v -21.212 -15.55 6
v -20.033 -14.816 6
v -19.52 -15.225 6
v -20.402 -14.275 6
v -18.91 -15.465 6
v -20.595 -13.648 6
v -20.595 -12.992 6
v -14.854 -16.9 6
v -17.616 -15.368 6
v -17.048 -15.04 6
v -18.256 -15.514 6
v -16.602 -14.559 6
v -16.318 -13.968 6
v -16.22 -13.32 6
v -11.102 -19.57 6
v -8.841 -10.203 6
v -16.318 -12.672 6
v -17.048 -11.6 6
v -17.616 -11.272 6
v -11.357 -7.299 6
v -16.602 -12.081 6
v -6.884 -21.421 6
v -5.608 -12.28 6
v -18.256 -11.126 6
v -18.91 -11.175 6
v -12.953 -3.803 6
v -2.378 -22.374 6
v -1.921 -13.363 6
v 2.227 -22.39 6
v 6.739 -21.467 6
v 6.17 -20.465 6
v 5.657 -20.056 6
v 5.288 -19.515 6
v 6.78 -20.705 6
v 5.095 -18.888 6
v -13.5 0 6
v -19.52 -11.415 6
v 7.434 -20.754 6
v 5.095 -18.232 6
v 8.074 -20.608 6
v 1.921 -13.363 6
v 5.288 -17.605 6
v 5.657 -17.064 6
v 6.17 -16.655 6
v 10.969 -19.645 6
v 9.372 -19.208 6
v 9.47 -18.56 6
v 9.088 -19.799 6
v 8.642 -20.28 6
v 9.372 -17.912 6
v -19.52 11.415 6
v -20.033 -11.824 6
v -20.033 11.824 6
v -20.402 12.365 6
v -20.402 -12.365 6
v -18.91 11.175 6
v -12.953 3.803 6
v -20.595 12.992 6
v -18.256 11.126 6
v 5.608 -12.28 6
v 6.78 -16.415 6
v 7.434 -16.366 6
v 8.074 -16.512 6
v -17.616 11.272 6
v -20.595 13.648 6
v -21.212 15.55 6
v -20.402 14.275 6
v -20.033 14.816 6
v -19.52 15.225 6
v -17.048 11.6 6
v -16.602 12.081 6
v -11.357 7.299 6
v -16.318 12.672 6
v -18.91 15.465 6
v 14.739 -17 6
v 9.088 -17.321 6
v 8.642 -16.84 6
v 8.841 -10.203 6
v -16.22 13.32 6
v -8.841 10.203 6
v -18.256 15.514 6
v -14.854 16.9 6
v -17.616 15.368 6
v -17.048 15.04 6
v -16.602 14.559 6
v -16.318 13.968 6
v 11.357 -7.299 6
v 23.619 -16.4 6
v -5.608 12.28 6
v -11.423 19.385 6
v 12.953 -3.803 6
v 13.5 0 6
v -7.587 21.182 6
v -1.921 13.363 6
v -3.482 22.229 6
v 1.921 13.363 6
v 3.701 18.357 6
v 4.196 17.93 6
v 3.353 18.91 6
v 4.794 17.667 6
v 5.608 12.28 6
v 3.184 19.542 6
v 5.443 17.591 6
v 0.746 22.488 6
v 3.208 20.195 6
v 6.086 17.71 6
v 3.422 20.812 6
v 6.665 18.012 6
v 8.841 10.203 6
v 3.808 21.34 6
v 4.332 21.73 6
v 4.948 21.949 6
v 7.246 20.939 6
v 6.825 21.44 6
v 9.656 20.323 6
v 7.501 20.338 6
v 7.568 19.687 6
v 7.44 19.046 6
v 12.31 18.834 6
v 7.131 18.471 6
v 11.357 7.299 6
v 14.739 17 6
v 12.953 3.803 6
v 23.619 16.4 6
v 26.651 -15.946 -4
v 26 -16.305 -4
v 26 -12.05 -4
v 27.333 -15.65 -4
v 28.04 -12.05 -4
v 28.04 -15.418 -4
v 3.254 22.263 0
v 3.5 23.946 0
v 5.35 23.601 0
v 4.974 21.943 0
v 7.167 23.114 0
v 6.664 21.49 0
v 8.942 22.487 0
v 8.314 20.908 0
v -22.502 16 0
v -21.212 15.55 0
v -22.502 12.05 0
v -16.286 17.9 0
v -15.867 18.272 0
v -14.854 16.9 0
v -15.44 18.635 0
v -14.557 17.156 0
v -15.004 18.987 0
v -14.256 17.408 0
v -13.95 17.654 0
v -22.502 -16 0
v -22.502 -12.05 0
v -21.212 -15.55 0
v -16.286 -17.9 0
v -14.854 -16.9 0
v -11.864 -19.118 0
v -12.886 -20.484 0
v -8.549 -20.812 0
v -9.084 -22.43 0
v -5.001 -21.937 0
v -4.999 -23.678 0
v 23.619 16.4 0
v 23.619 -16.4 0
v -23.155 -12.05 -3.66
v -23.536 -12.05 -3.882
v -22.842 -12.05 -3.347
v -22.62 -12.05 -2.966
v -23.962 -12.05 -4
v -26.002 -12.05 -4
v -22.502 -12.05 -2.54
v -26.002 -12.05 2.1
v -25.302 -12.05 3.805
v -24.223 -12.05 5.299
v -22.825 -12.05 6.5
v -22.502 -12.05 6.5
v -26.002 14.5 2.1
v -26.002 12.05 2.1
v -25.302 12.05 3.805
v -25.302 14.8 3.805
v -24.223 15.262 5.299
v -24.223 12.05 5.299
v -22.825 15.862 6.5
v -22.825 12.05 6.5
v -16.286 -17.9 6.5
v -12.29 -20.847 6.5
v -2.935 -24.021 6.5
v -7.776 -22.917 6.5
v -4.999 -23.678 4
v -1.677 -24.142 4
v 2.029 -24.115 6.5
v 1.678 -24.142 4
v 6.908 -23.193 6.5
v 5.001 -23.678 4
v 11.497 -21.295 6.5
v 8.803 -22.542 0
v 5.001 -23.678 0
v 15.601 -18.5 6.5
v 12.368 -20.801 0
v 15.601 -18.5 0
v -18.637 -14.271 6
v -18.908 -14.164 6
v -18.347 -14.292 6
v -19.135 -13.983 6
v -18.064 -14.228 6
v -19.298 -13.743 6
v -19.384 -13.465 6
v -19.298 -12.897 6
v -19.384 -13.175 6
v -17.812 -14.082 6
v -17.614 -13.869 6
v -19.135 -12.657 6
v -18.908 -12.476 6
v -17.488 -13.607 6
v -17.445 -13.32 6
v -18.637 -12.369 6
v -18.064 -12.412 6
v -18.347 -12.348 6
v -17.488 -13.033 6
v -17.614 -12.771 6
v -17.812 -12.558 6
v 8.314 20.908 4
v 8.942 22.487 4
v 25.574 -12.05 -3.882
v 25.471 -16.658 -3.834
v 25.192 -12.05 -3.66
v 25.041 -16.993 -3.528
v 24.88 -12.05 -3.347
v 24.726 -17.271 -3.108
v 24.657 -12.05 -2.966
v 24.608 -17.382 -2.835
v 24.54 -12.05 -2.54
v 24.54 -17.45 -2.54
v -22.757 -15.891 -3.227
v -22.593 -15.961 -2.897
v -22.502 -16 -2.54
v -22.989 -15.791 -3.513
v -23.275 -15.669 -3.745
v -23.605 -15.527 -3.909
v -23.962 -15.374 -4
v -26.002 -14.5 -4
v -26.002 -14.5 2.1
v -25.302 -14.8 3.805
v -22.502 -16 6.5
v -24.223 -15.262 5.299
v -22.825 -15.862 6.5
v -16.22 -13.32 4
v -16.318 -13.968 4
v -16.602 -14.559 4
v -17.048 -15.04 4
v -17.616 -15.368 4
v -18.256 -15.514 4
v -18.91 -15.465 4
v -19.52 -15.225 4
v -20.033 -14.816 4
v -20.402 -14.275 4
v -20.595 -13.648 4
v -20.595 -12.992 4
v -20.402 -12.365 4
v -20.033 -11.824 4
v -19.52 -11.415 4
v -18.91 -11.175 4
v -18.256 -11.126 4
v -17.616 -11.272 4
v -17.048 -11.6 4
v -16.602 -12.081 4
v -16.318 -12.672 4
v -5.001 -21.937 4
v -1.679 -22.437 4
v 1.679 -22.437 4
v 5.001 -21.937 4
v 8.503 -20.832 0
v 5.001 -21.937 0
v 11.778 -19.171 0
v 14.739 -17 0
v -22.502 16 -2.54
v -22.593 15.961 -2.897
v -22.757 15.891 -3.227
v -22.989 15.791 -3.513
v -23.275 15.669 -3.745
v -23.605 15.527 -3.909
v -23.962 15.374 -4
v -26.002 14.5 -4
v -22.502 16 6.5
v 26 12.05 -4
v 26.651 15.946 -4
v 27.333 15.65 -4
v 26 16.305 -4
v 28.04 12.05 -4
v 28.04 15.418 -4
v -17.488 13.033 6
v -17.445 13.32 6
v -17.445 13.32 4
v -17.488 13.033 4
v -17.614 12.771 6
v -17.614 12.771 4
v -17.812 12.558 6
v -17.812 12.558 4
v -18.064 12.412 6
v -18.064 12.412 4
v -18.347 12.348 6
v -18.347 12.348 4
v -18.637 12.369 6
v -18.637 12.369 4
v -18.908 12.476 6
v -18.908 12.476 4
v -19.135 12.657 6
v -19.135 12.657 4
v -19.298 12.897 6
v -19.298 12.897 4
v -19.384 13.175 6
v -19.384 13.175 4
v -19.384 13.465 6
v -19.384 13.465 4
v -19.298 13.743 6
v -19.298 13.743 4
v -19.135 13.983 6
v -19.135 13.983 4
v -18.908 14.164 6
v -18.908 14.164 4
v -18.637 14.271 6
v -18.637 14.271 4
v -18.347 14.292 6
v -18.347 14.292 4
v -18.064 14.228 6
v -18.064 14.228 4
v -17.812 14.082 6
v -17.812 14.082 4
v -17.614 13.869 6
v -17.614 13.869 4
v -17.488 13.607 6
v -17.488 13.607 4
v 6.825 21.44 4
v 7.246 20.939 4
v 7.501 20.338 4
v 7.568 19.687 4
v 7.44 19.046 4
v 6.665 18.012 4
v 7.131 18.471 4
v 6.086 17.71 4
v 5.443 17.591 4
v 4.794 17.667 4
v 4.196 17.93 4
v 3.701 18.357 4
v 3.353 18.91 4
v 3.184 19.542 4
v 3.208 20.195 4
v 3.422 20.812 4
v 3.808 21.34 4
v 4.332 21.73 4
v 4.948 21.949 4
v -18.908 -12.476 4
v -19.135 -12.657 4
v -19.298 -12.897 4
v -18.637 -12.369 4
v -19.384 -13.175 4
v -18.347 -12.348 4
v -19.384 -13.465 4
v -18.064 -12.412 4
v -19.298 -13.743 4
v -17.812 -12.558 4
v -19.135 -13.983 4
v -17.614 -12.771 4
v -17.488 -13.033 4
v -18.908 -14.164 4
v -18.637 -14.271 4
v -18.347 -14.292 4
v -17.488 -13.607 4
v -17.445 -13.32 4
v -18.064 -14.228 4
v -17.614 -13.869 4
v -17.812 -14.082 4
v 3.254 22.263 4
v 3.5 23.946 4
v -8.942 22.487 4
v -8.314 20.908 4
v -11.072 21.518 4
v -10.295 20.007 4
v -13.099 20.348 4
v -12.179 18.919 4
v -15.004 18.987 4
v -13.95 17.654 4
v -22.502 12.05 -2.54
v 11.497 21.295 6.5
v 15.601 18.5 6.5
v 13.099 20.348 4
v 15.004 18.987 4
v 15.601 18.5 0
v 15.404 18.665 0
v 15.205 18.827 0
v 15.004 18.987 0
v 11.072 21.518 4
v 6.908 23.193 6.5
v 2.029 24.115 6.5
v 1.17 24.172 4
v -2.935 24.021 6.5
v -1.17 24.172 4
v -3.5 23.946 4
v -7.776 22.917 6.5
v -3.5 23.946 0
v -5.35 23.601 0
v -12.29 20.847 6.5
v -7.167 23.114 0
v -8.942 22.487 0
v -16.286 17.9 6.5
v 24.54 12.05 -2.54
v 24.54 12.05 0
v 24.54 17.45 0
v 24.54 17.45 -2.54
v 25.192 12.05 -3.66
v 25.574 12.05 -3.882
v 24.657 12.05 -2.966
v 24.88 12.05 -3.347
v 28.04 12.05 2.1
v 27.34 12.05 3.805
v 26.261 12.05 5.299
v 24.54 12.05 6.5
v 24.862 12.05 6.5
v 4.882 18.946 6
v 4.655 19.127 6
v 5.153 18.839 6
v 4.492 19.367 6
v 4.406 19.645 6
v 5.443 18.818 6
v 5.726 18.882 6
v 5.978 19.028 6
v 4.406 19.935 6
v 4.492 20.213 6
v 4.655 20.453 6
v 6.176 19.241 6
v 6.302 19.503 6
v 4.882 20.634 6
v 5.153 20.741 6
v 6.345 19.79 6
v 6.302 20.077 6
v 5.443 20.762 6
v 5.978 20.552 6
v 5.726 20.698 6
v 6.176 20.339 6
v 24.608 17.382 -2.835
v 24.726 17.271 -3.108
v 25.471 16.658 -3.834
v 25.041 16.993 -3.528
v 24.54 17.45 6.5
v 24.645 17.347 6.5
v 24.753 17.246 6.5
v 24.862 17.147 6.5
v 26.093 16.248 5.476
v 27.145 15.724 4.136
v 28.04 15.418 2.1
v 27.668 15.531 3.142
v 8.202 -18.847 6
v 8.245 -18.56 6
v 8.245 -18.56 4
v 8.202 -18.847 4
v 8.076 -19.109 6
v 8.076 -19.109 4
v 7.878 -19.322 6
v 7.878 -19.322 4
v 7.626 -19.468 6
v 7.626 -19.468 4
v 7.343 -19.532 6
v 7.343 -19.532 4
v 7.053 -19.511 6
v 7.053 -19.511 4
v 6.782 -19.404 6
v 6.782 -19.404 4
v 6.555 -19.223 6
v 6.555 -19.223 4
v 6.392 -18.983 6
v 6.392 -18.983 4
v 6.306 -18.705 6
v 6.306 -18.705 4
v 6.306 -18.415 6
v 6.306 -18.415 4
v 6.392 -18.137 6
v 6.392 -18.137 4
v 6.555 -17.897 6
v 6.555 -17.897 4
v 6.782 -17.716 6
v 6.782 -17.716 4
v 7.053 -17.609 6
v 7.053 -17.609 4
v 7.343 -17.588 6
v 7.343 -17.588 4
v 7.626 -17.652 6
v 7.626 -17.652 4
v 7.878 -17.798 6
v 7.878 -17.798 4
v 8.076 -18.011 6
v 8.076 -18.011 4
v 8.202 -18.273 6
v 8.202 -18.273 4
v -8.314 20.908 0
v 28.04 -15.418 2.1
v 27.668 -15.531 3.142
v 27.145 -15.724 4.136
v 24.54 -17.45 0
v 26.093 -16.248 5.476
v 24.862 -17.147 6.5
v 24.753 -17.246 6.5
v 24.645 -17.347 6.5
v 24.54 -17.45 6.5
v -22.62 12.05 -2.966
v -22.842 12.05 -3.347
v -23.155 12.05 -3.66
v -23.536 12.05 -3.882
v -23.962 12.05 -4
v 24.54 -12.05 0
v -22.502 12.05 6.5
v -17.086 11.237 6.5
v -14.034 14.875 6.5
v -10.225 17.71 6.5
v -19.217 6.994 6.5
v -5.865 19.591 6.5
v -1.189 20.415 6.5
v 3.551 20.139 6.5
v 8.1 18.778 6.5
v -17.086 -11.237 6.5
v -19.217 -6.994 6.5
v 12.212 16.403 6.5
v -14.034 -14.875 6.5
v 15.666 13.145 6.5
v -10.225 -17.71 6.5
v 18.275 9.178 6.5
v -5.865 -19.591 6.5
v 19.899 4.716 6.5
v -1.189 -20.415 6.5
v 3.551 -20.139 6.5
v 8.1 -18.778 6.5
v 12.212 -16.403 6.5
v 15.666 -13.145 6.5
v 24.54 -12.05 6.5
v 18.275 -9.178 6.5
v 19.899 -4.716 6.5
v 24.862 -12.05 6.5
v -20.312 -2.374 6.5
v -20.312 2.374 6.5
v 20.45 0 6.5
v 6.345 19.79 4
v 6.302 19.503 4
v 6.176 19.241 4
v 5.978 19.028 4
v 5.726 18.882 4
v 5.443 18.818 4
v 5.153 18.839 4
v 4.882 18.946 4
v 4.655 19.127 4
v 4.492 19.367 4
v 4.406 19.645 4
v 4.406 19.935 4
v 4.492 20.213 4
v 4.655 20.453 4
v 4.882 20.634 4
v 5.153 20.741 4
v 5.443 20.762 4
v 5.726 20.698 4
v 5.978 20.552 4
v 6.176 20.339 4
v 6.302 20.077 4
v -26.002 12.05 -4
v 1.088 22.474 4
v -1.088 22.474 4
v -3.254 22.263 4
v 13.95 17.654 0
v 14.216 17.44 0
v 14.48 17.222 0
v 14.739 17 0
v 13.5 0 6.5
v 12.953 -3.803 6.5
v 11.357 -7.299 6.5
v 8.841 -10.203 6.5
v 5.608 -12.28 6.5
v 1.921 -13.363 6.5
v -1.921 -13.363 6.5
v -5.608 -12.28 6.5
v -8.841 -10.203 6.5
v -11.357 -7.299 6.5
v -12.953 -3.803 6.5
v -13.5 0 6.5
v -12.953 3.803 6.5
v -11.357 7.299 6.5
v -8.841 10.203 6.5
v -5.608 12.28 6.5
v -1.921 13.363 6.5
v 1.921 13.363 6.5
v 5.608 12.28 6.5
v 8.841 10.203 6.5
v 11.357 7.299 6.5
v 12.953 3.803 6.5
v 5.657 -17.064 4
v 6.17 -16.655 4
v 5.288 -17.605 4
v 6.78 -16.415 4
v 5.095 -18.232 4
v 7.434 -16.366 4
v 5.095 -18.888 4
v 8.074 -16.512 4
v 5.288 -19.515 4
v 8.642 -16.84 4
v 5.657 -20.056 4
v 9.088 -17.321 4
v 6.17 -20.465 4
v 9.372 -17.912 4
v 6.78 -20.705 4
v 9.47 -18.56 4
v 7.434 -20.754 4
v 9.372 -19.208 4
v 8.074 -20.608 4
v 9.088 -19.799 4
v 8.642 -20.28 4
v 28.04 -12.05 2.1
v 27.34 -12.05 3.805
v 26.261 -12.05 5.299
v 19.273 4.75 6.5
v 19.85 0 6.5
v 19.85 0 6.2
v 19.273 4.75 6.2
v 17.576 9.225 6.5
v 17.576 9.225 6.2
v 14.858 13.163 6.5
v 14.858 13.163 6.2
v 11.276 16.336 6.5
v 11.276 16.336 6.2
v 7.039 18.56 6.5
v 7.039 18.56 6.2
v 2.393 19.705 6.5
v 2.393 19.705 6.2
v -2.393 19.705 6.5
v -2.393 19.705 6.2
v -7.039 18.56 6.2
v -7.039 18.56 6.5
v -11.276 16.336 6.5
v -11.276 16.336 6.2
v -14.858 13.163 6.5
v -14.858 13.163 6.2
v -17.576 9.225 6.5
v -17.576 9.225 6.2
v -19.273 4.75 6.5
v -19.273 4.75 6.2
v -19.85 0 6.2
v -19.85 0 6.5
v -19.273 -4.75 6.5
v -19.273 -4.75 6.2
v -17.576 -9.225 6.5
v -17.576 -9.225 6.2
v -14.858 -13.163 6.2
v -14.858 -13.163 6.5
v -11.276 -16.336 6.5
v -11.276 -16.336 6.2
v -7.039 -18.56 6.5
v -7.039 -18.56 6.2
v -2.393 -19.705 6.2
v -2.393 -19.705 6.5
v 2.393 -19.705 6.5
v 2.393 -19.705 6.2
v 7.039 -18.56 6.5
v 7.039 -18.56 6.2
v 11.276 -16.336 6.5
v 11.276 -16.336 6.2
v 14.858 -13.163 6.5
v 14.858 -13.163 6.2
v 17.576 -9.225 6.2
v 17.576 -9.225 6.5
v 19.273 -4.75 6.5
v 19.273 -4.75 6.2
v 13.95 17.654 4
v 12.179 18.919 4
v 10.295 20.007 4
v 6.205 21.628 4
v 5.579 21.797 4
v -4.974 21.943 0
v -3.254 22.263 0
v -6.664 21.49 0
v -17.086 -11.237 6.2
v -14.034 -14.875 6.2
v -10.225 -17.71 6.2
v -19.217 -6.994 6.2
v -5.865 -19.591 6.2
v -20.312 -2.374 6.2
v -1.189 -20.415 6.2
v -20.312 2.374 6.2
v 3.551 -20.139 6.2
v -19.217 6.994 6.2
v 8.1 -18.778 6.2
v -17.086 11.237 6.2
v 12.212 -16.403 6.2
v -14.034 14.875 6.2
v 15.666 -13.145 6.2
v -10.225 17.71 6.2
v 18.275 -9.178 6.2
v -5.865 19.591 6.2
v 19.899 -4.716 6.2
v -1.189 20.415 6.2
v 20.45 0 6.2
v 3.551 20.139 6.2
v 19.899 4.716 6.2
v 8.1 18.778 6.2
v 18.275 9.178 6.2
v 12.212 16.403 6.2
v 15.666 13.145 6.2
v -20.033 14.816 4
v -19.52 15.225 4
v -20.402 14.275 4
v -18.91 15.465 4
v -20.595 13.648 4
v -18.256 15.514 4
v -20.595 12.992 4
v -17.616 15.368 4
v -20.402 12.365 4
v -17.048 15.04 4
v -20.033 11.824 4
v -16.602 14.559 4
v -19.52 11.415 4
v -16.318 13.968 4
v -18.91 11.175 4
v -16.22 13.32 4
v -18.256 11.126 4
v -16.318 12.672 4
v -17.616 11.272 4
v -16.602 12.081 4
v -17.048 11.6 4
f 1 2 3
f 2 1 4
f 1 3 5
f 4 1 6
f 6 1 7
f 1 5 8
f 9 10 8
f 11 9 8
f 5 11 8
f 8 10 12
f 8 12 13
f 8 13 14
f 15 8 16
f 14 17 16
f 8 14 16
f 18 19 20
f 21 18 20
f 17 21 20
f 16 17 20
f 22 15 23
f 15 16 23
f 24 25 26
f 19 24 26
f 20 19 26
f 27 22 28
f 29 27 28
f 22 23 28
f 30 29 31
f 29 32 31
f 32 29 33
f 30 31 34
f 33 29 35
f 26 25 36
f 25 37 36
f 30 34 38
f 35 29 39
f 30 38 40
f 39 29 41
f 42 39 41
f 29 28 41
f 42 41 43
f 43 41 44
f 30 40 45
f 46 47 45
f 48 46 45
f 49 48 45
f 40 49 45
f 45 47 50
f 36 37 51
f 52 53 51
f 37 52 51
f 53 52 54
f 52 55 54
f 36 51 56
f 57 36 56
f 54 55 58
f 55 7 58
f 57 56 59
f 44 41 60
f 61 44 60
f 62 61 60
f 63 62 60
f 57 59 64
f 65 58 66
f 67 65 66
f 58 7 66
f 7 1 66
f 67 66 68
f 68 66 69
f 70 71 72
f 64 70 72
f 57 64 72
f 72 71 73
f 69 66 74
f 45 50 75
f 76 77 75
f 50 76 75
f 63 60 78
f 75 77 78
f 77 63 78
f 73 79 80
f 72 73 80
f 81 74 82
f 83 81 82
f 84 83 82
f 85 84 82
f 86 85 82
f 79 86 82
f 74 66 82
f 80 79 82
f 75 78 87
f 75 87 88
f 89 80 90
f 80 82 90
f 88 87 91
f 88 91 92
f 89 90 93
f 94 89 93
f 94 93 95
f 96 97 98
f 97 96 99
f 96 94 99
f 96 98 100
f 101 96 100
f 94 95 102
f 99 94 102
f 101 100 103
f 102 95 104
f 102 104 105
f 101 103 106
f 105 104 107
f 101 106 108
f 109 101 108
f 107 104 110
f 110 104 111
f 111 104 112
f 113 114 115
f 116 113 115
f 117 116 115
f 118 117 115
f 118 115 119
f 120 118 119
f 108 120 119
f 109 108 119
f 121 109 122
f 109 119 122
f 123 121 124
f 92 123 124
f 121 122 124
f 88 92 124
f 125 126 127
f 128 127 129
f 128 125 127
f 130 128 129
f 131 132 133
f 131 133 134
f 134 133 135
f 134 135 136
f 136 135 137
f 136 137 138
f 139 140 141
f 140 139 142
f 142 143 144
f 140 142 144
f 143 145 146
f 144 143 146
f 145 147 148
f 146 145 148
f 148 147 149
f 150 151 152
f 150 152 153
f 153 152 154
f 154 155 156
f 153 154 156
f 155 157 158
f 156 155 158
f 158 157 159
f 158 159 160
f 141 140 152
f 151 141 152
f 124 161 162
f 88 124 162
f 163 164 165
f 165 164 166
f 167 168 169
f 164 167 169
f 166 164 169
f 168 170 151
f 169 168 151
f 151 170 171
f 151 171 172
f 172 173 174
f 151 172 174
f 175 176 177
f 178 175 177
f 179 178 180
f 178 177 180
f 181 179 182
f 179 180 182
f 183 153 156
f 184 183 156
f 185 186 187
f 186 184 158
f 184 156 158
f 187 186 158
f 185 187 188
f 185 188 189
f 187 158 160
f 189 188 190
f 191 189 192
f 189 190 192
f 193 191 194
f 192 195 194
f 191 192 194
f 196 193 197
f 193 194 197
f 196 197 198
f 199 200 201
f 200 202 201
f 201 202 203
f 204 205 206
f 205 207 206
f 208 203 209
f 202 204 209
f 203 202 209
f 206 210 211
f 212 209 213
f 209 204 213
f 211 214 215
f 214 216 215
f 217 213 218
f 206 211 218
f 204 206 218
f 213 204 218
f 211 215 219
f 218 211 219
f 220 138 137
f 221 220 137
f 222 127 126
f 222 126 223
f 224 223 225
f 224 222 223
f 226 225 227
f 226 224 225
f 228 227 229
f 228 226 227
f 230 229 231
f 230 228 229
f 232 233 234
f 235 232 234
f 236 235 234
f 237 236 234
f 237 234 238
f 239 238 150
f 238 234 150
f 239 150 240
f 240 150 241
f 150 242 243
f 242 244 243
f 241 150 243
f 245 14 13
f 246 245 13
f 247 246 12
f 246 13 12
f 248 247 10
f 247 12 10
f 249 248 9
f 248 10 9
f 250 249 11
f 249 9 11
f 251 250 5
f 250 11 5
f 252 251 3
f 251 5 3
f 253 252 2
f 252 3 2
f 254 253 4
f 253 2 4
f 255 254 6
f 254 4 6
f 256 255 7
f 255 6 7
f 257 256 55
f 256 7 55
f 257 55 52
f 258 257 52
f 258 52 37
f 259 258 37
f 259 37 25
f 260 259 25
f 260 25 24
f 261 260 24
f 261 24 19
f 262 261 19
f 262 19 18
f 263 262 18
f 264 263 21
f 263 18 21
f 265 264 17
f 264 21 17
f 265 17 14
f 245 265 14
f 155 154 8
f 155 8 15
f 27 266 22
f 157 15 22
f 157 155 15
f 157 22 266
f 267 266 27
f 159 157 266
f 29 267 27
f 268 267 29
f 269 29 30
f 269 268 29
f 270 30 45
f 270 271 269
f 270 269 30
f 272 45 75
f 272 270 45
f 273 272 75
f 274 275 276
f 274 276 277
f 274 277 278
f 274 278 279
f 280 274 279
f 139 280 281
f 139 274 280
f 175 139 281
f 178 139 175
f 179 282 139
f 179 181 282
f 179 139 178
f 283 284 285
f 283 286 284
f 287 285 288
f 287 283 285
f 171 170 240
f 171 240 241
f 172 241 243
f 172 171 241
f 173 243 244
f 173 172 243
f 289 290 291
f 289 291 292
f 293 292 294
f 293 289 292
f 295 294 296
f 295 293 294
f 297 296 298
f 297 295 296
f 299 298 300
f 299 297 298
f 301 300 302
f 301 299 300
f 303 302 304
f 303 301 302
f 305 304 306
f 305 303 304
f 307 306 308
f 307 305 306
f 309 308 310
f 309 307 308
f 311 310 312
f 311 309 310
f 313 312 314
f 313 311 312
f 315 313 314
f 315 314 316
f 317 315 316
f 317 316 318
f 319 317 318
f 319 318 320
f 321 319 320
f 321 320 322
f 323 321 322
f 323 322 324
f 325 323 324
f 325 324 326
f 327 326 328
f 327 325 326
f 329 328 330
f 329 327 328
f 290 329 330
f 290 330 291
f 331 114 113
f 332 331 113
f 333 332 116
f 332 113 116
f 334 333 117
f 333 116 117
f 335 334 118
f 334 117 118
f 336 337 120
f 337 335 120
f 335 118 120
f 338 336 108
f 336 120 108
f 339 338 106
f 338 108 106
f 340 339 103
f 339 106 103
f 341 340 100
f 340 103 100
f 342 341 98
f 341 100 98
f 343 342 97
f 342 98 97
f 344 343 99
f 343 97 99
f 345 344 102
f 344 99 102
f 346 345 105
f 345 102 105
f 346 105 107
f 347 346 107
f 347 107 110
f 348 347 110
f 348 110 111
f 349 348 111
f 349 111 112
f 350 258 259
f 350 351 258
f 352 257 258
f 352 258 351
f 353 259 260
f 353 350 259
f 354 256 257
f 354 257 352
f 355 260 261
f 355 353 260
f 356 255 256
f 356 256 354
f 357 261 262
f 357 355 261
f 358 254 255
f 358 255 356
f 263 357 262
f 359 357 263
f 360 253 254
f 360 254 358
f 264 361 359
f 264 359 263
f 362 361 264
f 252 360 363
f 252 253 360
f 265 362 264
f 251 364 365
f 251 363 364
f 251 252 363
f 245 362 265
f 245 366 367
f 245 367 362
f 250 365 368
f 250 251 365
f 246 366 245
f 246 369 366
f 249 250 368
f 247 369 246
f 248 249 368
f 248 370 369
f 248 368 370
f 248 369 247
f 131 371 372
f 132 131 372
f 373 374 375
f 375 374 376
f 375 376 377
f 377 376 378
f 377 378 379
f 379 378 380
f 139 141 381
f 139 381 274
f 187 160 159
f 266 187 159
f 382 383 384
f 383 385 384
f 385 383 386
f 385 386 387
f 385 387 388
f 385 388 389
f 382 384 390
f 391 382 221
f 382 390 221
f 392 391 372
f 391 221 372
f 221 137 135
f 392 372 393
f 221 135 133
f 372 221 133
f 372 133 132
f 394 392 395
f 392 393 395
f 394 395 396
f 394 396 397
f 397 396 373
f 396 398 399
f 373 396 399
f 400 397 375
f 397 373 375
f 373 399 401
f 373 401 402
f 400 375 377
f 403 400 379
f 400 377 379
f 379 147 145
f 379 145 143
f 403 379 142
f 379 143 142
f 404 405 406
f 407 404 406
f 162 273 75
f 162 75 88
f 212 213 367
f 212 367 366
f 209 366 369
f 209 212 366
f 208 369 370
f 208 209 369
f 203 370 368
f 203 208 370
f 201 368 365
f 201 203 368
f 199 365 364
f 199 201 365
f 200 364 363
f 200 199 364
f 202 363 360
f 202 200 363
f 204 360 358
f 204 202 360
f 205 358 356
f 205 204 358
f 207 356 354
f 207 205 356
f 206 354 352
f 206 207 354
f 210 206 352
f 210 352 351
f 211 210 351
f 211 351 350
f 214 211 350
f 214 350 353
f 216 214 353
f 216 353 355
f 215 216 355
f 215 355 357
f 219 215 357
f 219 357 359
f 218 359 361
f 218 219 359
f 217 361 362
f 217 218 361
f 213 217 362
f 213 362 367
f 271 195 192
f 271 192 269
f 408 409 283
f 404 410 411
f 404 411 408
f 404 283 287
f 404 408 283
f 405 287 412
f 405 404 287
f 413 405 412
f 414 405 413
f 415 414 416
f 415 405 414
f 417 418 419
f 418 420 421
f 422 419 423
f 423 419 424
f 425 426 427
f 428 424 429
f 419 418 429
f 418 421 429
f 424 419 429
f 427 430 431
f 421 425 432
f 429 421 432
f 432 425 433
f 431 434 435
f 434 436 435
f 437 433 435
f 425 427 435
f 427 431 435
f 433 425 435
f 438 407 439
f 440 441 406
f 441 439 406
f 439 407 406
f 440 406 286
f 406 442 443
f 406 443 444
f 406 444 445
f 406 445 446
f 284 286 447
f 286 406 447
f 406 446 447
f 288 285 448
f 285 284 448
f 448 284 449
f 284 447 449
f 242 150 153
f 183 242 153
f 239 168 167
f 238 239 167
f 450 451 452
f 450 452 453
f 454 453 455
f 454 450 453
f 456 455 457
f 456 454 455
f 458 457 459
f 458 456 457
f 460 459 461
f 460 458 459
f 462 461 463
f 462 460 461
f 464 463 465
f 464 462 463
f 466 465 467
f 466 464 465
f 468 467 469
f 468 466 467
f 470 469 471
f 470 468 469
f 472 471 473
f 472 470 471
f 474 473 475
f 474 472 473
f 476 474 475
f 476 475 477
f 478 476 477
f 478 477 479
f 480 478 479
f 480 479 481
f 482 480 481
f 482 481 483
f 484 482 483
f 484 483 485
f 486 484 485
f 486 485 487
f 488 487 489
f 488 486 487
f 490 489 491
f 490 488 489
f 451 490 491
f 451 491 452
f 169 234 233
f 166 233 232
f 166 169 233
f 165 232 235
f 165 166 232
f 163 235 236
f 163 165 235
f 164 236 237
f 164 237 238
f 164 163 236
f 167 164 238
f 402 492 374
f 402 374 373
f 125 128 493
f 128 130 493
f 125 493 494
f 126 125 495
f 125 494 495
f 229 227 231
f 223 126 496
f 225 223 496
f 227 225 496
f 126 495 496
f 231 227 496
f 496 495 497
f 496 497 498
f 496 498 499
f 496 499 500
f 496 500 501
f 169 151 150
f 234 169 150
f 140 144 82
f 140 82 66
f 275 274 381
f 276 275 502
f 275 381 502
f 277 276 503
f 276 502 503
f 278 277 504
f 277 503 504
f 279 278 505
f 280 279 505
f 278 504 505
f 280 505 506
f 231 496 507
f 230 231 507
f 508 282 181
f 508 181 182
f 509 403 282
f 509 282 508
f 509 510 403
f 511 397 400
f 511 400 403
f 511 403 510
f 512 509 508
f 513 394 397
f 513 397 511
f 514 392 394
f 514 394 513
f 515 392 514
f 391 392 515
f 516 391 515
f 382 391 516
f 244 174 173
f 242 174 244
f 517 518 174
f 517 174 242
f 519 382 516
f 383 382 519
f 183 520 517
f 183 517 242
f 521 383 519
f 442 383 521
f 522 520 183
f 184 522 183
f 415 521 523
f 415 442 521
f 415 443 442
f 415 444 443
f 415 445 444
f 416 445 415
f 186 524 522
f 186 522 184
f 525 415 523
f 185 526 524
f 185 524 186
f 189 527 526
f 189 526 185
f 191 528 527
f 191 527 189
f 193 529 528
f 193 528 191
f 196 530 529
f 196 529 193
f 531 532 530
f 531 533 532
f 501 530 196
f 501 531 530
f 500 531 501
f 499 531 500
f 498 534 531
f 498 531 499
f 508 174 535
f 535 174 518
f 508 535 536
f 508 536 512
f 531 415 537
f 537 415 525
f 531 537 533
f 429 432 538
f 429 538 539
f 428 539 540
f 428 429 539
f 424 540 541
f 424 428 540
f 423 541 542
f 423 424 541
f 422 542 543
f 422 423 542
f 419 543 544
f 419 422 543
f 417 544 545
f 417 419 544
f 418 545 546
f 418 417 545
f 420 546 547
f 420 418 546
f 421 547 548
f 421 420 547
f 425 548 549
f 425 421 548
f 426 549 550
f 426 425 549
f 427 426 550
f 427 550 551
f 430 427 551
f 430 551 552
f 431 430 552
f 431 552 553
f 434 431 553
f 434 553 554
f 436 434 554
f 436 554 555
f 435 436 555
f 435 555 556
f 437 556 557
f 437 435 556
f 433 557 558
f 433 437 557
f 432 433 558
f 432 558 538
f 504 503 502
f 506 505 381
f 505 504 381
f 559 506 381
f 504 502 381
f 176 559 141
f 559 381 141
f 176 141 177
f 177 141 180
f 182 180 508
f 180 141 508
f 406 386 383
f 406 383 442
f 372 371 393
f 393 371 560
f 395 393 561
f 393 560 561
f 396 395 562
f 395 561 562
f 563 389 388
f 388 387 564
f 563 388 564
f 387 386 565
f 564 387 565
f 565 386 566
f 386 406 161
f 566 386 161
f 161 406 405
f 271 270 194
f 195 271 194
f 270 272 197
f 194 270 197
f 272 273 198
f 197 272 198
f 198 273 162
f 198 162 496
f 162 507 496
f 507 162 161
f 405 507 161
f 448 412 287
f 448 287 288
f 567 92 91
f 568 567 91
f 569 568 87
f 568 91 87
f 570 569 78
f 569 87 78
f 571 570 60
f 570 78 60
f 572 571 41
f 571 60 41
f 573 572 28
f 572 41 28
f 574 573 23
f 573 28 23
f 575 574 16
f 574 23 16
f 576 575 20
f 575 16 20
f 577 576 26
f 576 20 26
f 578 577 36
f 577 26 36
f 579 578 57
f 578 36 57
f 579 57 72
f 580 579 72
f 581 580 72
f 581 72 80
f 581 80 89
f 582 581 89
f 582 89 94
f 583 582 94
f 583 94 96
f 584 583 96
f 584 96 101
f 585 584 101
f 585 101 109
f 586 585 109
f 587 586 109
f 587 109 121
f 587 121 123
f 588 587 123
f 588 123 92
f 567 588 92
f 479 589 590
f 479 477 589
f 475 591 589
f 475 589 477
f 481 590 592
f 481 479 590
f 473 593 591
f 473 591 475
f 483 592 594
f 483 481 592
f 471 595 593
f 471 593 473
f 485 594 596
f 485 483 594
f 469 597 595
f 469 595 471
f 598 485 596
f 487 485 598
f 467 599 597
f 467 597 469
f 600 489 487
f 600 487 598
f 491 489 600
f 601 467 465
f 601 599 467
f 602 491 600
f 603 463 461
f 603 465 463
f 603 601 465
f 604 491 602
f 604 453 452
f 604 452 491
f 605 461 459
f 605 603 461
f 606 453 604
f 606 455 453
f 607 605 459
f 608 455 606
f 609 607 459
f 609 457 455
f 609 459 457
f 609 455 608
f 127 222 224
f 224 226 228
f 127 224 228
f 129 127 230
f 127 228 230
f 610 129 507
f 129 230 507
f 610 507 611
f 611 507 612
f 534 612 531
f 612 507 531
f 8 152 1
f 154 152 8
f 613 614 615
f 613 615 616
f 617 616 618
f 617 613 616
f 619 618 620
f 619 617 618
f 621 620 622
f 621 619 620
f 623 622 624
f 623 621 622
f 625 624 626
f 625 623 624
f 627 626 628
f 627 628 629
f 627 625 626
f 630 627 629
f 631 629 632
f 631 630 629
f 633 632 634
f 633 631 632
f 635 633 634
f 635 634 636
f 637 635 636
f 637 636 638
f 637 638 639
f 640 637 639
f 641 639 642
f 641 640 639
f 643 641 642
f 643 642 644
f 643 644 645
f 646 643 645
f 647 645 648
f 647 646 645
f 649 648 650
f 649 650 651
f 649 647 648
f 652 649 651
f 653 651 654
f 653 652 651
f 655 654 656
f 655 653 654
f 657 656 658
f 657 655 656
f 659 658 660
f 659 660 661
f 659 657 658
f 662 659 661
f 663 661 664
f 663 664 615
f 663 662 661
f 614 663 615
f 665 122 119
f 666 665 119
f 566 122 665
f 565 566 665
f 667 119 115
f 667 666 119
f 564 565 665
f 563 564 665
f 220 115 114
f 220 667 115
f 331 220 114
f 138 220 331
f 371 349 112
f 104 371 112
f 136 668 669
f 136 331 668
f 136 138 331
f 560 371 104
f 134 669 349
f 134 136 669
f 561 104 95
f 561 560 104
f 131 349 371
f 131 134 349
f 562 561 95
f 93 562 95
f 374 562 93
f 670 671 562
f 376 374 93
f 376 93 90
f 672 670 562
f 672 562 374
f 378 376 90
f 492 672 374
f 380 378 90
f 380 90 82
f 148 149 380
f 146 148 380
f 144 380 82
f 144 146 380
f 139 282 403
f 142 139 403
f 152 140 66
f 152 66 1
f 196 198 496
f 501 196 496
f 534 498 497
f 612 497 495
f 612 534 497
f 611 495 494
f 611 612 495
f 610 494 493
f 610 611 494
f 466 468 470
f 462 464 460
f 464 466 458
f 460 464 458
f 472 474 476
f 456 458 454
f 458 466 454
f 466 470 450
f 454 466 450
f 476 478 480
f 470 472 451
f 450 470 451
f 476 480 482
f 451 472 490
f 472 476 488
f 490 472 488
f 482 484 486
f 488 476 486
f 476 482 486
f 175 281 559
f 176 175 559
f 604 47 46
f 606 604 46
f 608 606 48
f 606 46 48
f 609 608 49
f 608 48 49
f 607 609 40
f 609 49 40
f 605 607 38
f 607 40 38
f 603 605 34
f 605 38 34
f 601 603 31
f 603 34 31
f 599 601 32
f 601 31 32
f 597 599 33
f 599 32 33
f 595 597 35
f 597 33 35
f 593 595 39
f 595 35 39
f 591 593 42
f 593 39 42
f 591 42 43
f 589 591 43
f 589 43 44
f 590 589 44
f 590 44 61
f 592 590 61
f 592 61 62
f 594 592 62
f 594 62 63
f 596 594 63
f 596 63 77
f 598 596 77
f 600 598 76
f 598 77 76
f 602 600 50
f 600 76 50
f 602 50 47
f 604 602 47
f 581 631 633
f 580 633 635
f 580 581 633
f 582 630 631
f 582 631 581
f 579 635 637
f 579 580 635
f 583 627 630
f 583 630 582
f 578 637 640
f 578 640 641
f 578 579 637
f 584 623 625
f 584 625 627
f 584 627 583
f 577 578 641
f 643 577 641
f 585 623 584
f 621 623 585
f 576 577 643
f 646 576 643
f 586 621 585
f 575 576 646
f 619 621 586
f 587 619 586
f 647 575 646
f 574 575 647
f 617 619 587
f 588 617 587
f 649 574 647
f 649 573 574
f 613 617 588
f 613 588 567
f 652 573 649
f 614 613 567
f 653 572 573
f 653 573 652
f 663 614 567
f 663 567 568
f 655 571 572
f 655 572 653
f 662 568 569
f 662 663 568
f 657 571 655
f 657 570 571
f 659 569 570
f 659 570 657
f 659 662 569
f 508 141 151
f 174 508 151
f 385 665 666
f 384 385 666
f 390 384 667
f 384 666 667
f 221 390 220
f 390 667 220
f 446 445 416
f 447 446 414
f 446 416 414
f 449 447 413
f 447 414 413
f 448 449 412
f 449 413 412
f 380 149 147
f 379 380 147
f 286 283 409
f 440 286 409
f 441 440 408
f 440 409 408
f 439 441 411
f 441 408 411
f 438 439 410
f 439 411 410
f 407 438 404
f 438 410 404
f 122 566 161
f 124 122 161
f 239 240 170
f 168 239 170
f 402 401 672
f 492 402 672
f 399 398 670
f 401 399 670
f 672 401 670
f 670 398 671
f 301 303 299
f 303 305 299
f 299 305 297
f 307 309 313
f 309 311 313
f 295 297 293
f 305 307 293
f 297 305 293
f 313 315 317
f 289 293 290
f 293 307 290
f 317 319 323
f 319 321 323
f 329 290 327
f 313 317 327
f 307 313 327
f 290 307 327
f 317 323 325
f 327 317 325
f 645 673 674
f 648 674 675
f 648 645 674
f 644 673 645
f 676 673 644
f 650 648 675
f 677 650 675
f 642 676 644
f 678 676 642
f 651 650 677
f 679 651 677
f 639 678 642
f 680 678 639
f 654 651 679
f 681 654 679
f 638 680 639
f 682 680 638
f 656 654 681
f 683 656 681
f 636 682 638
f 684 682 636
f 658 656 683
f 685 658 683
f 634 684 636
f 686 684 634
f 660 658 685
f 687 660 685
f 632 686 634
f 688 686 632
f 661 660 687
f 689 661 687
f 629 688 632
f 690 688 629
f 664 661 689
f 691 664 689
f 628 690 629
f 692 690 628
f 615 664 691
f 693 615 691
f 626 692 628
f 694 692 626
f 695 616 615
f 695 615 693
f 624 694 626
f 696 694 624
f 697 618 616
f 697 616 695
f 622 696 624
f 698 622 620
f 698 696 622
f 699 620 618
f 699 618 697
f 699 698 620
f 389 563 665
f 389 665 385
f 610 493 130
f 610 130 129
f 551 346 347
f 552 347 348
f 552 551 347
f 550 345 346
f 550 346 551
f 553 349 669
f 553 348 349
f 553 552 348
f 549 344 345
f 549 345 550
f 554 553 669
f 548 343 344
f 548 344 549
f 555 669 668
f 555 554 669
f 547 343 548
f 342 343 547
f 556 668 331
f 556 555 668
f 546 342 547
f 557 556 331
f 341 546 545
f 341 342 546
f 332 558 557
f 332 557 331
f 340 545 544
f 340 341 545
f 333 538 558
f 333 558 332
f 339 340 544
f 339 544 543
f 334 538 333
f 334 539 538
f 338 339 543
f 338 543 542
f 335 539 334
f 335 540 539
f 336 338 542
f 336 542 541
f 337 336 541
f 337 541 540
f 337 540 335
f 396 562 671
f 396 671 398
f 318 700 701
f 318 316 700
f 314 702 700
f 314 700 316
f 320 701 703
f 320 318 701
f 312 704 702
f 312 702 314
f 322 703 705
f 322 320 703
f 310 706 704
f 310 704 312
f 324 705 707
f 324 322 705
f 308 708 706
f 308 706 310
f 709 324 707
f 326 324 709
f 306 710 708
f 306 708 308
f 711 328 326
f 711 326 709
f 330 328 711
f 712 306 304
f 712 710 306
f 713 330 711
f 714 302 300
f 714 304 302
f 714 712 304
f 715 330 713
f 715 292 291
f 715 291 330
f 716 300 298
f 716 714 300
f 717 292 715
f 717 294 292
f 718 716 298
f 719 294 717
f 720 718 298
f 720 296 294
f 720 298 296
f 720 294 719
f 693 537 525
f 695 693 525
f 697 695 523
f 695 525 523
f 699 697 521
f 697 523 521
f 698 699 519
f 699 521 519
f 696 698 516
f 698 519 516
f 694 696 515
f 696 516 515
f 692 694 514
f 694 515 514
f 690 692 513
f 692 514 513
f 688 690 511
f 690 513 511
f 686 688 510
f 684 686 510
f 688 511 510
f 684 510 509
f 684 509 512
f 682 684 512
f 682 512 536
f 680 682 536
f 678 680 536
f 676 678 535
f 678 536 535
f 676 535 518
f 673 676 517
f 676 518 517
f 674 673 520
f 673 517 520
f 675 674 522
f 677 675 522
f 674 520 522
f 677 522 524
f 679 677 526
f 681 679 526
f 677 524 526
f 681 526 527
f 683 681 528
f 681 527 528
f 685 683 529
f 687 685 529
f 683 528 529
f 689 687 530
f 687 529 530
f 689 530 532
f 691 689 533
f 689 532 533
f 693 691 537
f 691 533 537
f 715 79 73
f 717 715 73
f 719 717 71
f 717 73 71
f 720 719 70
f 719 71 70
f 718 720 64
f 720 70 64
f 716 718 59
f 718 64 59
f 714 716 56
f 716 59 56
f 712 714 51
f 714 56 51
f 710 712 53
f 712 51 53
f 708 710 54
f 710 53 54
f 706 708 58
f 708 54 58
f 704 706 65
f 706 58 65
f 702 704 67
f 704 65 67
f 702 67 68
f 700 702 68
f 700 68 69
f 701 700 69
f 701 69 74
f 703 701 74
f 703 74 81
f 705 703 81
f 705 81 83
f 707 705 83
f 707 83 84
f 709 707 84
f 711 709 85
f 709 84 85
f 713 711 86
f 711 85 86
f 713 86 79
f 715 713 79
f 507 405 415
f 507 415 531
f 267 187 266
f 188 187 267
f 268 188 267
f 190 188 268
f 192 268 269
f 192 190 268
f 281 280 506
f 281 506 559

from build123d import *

# Parameters (mm, degrees)
PAD_DEPTH            = 6.5
POCKET_DEPTH         = 6
SKETCH002_R          = 13.5
POCKET001_DEPTH      = 1
SKETCH003_W          = 5.4
SKETCH003_H          = 6.5
PAD001_DEPTH         = 3.5
POCKET002_DEPTH      = 10
SKETCH010_W          = 3.95
SKETCH010_H          = 6.5
PAD002_DEPTH         = 3.5
POCKET005_DEPTH      = 10
SKETCH014_R          = 20.45
SKETCH014_R_2        = 19.85
POCKET008_DEPTH      = 0.3
SKETCH015_R          = 2.2
SKETCH015_R_2        = 0.975
PAD003_DEPTH         = 2
POCKET009_DEPTH      = 4
POCKET010_DEPTH      = 4
PAD004_DEPTH         = 4
POCKET013_DEPTH      = 12.151
POCKET013_DEPTH_BACK = 36.251


with BuildPart() as part:
    # Sketch → Pad (new body)
    with BuildSketch(Plane.XY):
        with BuildLine():
            Line((-22.5019915649, 16), (-22.5019915649, -16))
            Line((-22.5019915649, -16), (-16.2858834578, -17.9))
            ThreePointArc((-16.2858834578, -17.9), (-0.4552796053, -24.1957169863), (15.6009615088, -18.5))
            Line((15.6009615088, -18.5), (24.5395016581, -17.45))
            Line((24.5395016581, 17.45), (24.5395016581, -17.45))
            Line((15.6009615088, 18.5), (24.5395016581, 17.45))
            ThreePointArc((15.6009615088, 18.5), (-0.4552796053, 24.1957169863), (-16.2858834578, 17.9))
            Line((-22.5019915649, 16), (-16.2858834578, 17.9))
        make_face()
    extrude(amount=PAD_DEPTH)

    # Sketch001 → Pocket (cut)
    with BuildSketch(Plane.XY):
        with BuildLine():
            Line((-14.8539557021, 16.9), (-21.2122180433, 15.55))
            Line((-21.2122180433, 15.55), (-21.2122180433, -15.55))
            Line((-21.2122180433, -15.55), (-14.8539557021, -16.9))
            ThreePointArc((-14.8539557021, -16.9), (-0.0760301383, -22.4998715423), (14.739402973, -17))
            Line((14.739402973, -17), (23.6191552218, -16.4))
            Line((23.6191552218, 16.4), (23.6191552218, -16.4))
            Line((14.739402973, 17), (23.6191552218, 16.4))
            ThreePointArc((14.739402973, 17), (-0.0760301383, 22.4998715423), (-14.8539557021, 16.9))
        make_face()
    extrude(amount=POCKET_DEPTH, mode=Mode.SUBTRACT)

    # Sketch002 (on Face19 of Pocket) → Pocket001 (cut)
    with BuildSketch(Plane(origin=(0, 0, 6), x_dir=(1, 0, 0), z_dir=(0, 0, -1))):
        Circle(SKETCH002_R)
    extrude(amount=-POCKET001_DEPTH, mode=Mode.SUBTRACT)

    # Sketch003 (on Face7 of Pad) → Pad001 (join)
    with BuildSketch(Plane.YZ.offset(24.5395016581)):
        with Locations((-14.75, 3.25)):
            Rectangle(SKETCH003_W, SKETCH003_H)
        with Locations((14.75, 3.25)):
            Rectangle(SKETCH003_W, SKETCH003_H)
    extrude(amount=PAD001_DEPTH)

    # Sketch006 (on Face22 of Pad001) → Pocket002 (cut)
    with BuildSketch(Plane.XY.offset(6.5)):
        with BuildLine():
            ThreePointArc((24.5395016581, 17.45), (26.1592830786, 16.2095505764), (28.0395016581, 15.4176006311))
            Line((28.0395016581, 17.45), (28.0395016581, 15.4176006311))
            Line((28.0395016581, 17.45), (24.5395016581, 17.45))
        make_face()
        with BuildLine():
            ThreePointArc((28.0395016581, -15.4176006311), (26.1592830786, -16.2095505765), (24.5395016581, -17.4500000001))
            Line((28.0395016581, -17.45), (24.5395016581, -17.45))
            Line((28.0395016581, -15.4176006311), (28.0395016581, -17.45))
        make_face()
    extrude(amount=-POCKET002_DEPTH, mode=Mode.SUBTRACT)

    # Sketch010 (on Face3 of Pad) → Pad002 (join)
    with BuildSketch(Plane(origin=(-22.5019915649, 0, 0), x_dir=(0, -1, 0), z_dir=(-1, 0, 0))):
        with Locations((-14.025, 3.25)):
            Rectangle(SKETCH010_W, SKETCH010_H)
        with Locations((14.025, 3.25)):
            Rectangle(SKETCH010_W, SKETCH010_H)
    extrude(amount=PAD002_DEPTH)

    # Sketch011 (on Face28 of Pad002) → Pocket005 (cut)
    with BuildSketch(Plane.XY.offset(6.5)):
        Polygon((-26.0019915649, 16), (-22.5019915649, 16), (-26.0019915649, 14.5), align=None)
        Polygon((-22.5019915649, -16), (-26.0019915649, -14.5), (-26.0019915649, -16), align=None)
    extrude(amount=-POCKET005_DEPTH, mode=Mode.SUBTRACT)

    # Sketch014 (on Face10 of Pad) → Pocket008 (cut)
    with BuildSketch(Plane.XY.offset(6.5)):
        Circle(SKETCH014_R)
        Circle(SKETCH014_R_2, mode=Mode.SUBTRACT)
    extrude(amount=-POCKET008_DEPTH, mode=Mode.SUBTRACT)

    # Sketch015 (on Face19 of Pocket) → Pad003 (join)
    with BuildSketch(Plane(origin=(0, 0, 6), x_dir=(1, 0, 0), z_dir=(0, 0, -1))):
        with Locations((-18.42, 13.32)):
            Circle(SKETCH015_R)
        with Locations((-18.42, 13.32)):
            Circle(SKETCH015_R_2, mode=Mode.SUBTRACT)
        with Locations((7.27, 18.56)):
            Circle(SKETCH015_R)
        with Locations((7.27, 18.56)):
            Circle(SKETCH015_R_2, mode=Mode.SUBTRACT)
        with Locations((5.37, -19.79)):
            Circle(SKETCH015_R)
        with Locations((5.37, -19.79)):
            Circle(SKETCH015_R_2, mode=Mode.SUBTRACT)
        with Locations((-18.42, -13.32)):
            Circle(SKETCH015_R)
        with Locations((-18.42, -13.32)):
            Circle(SKETCH015_R_2, mode=Mode.SUBTRACT)
    extrude(amount=PAD003_DEPTH)

    # Sketch016 (on Face4 of Pocket) → Pocket009 (cut)
    with BuildSketch(Plane(origin=(0, 0, 0), x_dir=(1, 0, 0), z_dir=(0, 0, -1))):
        with BuildLine():
            Line((-4.9992330338, 23.6779996848), (-5.0007669662, 21.9372361465))
            ThreePointArc((5.0007669662, 21.9372361465), (0, 22.5), (-5.0007669662, 21.9372361465))
            Line((5.0007669662, 23.6776757675), (5.0007669662, 21.9372361465))
            ThreePointArc((5.0007669662, 23.6776757675), (0.00078388, 24.1999999873), (-4.9992330338, 23.6779996848))
        make_face()
    extrude(amount=-POCKET009_DEPTH, mode=Mode.SUBTRACT)

    # Sketch017 (on Face4 of Pocket) → Pocket010 (cut)
    with BuildSketch(Plane(origin=(0, 0, 0), x_dir=(1, 0, 0), z_dir=(0, 0, -1))):
        with BuildLine():
            ThreePointArc((-3.2541322314, -22.2634369184), (0, -22.5), (3.2541322314, -22.2634369184))
            Line((3.2541322314, -22.2634369184), (3.5, -23.9455632634))
            ThreePointArc((-3.5, -23.9455632634), (0, -24.2), (3.5, -23.9455632634))
            Line((-3.2541322314, -22.2634369184), (-3.5, -23.9455632634))
        make_face()
        with BuildLine():
            ThreePointArc((-13.9498796389, -17.6536358312), (-11.25, -19.4855715851), (-8.3135572795, -20.9077680626))
            Line((-8.3135572795, -20.9077680626), (-8.9416927184, -22.487466094))
            ThreePointArc((-15.0038705449, -18.987466094), (-12.1, -20.9578147716), (-8.9416927184, -22.487466094))
            Line((-13.9498796389, -17.6536358312), (-15.0038705449, -18.987466094))
        make_face()
        with BuildLine():
            ThreePointArc((8.3135572795, -20.9077680626), (11.25, -19.4855715851), (13.9498796389, -17.6536358312))
            Line((13.9498796389, -17.6536358312), (15.0038705449, -18.987466094))
            ThreePointArc((8.9416927184, -22.487466094), (12.1, -20.9578147716), (15.0038705449, -18.987466094))
            Line((8.3135572795, -20.9077680626), (8.9416927184, -22.487466094))
        make_face()
    extrude(amount=-POCKET010_DEPTH, mode=Mode.SUBTRACT)

    # Sketch018 (on Face8 of Pocket005) → Pad004 (join)
    with BuildSketch(Plane(origin=(0, 0, 0), x_dir=(1, 0, 0), z_dir=(0, 0, -1))):
        Polygon((-26.0019915649, 14.5), (-26.0019915649, 12.05), (-22.5019915649, 12.05), (-22.5019915649, 16), align=None)
        Polygon((-26.0019915649, -12.05), (-22.5019915649, -12.05), (-22.5019915649, -16), (-26.0019915649, -14.5), align=None)
        with BuildLine():
            Line((24.5395016581, 17.4500000001), (24.5395016581, 12.05))
            Line((28.0395016581, 12.05), (24.5395016581, 12.05))
            Line((28.0395016581, 15.4176006311), (28.0395016581, 12.05))
            ThreePointArc((24.5395016581, 17.4500000001), (26.1592830786, 16.2095505765), (28.0395016581, 15.4176006311))
        make_face()
        with BuildLine():
            Line((24.5395016581, -12.05), (24.5395016581, -17.45))
            ThreePointArc((28.0395016581, -15.4176006311), (26.1592830786, -16.2095505764), (24.5395016581, -17.45))
            Line((28.0395016581, -12.05), (28.0395016581, -15.4176006311))
            Line((24.5395016581, -12.05), (28.0395016581, -12.05))
        make_face()
    extrude(amount=PAD004_DEPTH)

    # Sketch021 (on Face50 of Pad004) → Pocket013 (cut, two sides)
    with BuildSketch(Plane(origin=(0, -12.05, 0), x_dir=(-1, 0, 0), z_dir=(0, 1, 0))) as pocket013_sk:
        with BuildLine():
            Line((-24.8620157143, 6.5), (-28.0395016581, 6.5))
            Line((-28.0395016581, 6.5), (-28.0395016581, 2.1))
            ThreePointArc((-24.8620157143, 6.5), (-26.8441838951, 4.5841143344), (-28.0395016581, 2.1))
        make_face()
        with BuildLine():
            ThreePointArc((-25.9995016581, -4), (-25.0260575173, -3.5134441408), (-24.5395016581, -2.54))
            Line((-24.5395016581, -4), (-24.5395016581, -2.54))
            Line((-24.5395016581, -4), (-25.9995016581, -4))
        make_face()
        with BuildLine():
            Line((22.5019915649, -4), (22.5019915649, -2.54))
            ThreePointArc((22.5019915649, -2.54), (22.9885474241, -3.5134441408), (23.9619915649, -4))
            Line((22.5019915649, -4), (23.9619915649, -4))
        make_face()
        with BuildLine():
            Line((26.0019915649, 6.5), (26.0019915649, 2.1))
            ThreePointArc((26.0019915649, 2.1), (24.806673802, 4.5841143344), (22.8245056212, 6.5))
            Line((26.0019915649, 6.5), (22.8245056212, 6.5))
        make_face()
    extrude(amount=-POCKET013_DEPTH, mode=Mode.SUBTRACT)
    extrude(pocket013_sk.sketch, amount=POCKET013_DEPTH_BACK, mode=Mode.SUBTRACT)


solid = part.part
